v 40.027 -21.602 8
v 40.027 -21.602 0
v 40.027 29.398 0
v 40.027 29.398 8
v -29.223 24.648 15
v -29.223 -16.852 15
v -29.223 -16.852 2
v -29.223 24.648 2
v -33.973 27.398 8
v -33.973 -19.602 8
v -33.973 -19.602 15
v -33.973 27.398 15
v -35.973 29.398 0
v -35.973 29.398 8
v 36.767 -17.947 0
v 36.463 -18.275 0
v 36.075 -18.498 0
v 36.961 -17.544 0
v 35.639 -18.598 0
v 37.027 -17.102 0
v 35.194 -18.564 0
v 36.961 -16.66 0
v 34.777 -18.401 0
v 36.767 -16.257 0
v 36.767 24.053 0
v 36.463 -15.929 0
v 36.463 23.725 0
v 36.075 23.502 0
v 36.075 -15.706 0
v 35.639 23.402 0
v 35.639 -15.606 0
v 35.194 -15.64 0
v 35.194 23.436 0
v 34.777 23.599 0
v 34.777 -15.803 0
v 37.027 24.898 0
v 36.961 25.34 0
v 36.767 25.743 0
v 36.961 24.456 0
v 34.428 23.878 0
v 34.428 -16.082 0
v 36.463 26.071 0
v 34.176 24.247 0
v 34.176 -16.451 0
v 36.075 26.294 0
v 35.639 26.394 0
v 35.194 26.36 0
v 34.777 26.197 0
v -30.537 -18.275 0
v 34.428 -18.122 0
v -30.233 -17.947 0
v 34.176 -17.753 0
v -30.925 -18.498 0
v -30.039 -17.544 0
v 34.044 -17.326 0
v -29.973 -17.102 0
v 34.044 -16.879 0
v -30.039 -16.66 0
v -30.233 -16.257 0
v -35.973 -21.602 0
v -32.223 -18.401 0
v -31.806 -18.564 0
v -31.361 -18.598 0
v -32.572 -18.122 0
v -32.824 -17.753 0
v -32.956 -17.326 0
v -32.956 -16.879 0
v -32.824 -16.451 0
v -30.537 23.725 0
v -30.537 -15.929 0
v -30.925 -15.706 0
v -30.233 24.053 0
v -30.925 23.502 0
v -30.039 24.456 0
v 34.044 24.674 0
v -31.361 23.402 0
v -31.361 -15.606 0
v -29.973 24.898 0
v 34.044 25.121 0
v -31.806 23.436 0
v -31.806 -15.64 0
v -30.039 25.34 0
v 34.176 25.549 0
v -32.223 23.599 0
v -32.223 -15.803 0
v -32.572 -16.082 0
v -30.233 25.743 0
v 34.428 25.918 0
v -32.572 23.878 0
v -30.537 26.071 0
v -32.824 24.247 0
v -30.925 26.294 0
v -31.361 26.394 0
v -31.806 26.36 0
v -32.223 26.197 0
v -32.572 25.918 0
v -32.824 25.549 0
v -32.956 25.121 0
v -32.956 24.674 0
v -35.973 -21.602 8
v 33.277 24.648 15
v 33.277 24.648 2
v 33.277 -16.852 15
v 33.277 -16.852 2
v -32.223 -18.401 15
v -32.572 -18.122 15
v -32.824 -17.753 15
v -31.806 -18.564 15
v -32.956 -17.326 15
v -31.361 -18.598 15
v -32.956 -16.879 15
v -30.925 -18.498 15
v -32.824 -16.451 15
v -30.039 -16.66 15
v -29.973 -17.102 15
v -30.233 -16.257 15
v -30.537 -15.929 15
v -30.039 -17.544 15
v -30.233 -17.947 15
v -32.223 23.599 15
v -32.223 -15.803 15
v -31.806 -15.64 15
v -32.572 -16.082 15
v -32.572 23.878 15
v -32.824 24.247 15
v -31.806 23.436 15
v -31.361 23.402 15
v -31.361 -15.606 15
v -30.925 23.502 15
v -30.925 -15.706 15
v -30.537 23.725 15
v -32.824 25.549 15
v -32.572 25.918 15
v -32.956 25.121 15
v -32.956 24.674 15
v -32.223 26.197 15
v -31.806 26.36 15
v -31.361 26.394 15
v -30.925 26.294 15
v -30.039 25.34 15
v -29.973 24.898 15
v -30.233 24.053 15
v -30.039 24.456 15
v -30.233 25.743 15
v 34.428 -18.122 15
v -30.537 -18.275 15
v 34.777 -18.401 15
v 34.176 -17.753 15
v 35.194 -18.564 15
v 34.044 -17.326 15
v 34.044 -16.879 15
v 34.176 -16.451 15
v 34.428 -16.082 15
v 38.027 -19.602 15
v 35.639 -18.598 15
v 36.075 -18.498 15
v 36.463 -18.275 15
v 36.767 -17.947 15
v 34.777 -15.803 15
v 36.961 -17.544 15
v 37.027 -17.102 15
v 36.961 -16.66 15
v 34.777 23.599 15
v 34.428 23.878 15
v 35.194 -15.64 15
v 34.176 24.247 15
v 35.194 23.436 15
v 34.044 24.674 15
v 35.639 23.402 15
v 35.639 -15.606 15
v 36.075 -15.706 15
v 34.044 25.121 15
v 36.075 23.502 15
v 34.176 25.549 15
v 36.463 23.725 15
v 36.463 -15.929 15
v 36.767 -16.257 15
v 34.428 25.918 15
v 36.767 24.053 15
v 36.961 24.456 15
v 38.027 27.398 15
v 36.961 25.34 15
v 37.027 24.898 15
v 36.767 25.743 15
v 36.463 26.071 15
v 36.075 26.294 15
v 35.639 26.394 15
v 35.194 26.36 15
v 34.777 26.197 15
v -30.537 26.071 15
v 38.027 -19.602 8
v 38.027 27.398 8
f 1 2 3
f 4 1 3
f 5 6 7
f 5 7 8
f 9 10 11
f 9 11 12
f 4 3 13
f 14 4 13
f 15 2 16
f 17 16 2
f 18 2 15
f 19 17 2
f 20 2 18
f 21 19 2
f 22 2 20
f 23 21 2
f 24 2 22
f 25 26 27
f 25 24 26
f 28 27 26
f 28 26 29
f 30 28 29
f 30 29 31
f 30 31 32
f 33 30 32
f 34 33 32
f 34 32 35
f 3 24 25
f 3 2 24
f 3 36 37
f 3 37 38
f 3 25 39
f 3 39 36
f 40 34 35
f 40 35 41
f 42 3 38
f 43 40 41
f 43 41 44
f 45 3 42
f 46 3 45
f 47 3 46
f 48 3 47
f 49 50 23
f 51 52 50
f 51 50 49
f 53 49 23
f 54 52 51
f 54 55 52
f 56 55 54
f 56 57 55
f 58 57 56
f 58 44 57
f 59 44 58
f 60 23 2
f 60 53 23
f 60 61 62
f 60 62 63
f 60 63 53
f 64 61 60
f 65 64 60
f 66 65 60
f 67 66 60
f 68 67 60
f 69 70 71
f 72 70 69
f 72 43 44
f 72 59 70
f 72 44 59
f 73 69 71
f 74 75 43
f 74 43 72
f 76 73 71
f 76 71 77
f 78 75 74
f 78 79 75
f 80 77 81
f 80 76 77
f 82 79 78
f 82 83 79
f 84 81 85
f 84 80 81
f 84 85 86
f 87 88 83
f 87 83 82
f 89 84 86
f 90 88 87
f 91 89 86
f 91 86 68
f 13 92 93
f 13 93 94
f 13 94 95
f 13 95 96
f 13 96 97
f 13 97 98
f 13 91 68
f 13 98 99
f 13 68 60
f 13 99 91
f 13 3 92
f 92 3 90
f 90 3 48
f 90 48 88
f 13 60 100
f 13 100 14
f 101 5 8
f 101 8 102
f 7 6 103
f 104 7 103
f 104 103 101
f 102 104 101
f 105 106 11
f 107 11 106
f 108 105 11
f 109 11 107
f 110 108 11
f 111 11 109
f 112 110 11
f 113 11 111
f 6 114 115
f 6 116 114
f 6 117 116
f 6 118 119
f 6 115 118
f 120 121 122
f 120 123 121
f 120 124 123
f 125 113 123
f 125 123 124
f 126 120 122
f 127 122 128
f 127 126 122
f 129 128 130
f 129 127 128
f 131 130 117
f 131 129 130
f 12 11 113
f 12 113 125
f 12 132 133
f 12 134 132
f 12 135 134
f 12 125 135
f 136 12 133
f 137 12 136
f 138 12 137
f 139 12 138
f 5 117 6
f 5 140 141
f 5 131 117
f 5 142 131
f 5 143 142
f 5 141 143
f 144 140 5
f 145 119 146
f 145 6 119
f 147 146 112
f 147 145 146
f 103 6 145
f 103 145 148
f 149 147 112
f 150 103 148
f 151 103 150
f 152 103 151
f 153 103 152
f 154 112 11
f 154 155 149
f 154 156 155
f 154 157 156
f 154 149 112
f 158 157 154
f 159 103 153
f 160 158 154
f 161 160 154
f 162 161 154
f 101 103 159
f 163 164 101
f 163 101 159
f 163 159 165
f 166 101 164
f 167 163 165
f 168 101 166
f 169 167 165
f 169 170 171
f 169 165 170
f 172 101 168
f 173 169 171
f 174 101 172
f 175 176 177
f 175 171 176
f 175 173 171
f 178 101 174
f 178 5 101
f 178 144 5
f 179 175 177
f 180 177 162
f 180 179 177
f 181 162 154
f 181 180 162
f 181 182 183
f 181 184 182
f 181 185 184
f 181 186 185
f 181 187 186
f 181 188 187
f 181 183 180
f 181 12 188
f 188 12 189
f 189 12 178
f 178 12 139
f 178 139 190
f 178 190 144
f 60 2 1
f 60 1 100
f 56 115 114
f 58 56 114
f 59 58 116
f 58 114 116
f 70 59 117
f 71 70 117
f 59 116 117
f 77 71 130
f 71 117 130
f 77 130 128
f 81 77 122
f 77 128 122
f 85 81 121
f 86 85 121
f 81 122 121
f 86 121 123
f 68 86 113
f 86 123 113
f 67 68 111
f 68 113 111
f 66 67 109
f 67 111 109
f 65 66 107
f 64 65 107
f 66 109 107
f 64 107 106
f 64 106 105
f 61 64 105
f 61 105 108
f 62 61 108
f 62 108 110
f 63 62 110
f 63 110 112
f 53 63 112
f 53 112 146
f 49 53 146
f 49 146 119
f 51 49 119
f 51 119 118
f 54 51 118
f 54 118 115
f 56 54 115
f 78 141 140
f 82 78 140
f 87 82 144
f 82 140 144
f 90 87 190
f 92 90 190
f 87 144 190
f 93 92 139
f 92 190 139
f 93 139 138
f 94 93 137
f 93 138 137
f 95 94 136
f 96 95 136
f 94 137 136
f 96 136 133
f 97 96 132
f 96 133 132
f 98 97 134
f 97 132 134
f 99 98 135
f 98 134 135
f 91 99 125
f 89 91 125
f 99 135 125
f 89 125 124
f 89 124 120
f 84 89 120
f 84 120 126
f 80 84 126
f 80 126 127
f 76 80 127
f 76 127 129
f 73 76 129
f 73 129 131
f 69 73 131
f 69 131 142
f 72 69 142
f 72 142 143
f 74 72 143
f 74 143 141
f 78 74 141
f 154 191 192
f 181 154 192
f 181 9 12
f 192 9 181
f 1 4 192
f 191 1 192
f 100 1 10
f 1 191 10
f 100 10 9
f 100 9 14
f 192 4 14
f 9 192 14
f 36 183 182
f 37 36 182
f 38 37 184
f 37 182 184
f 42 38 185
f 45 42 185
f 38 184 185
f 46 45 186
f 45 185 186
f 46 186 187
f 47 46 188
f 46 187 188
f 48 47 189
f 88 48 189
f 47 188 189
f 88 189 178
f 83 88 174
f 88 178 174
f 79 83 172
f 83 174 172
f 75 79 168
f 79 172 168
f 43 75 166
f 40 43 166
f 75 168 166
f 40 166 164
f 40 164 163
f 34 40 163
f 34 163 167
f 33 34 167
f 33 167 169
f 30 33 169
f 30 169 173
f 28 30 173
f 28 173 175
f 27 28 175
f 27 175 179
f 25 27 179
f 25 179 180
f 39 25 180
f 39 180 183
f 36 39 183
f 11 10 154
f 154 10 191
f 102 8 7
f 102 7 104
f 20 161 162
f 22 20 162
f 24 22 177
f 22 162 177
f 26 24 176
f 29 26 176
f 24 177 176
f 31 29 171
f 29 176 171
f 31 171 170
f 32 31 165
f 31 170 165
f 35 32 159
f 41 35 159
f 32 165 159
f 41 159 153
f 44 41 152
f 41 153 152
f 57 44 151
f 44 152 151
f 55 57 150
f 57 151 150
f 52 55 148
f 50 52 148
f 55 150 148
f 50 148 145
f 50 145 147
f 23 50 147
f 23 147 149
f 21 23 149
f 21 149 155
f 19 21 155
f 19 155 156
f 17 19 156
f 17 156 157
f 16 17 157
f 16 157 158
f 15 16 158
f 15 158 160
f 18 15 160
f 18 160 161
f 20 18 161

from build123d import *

# Parameters (mm, degrees)
SKETCH_1_W          = 72
SKETCH_1_H          = 47
EXTRUDE_1_DEPTH     = 15
SKETCH_2_W          = 62.5
SKETCH_2_H          = 41.5
CUT_EXTRUDE_1_DEPTH = 13
SKETCH_3_R          = 1.5
CUT_EXTRUDE_3_DEPTH = 16
SKETCH_4_W          = 76
SKETCH_4_H          = 51
SKETCH_4_W_2        = 72
SKETCH_4_H_2        = 47
EXTRUDE_2_DEPTH     = 8


with BuildPart() as part:
    # ｽｹｯﾁ1 → ﾎﾞｽ - 押し出し1 (new body)
    with BuildSketch(Plane.XY):
        with Locations((2.027327289, 3.897905759)):
            Rectangle(SKETCH_1_W, SKETCH_1_H)
    extrude(amount=EXTRUDE_1_DEPTH)

    # ｽｹｯﾁ2 → ｶｯﾄ - 押し出し1 (cut)
    with BuildSketch(Plane.XY.offset(15)):
        with Locations((2.027327289, 3.897905759)):
            Rectangle(SKETCH_2_W, SKETCH_2_H)
    extrude(amount=-CUT_EXTRUDE_1_DEPTH, mode=Mode.SUBTRACT)

    # ｽｹｯﾁ3 → ｶｯﾄ - 押し出し3 (cut, through all)
    with BuildSketch(Plane.XY.offset(15)):
        with Locations((-31.472672711, 24.897905759)):
            Circle(SKETCH_3_R)
        with Locations((35.527327289, 24.897905759)):
            Circle(SKETCH_3_R)
        with Locations((-31.472672711, -17.102094241)):
            Circle(SKETCH_3_R)
        with Locations((35.527327289, -17.102094241)):
            Circle(SKETCH_3_R)
    extrude(amount=-CUT_EXTRUDE_3_DEPTH, mode=Mode.SUBTRACT)

    # ｽｹｯﾁ4 → ﾎﾞｽ - 押し出し2 (add)
    with BuildSketch(Plane(origin=(0, 0, 0), x_dir=(-1, 0, 0), z_dir=(0, 0, -1))):
        with Locations((-2.027327289, 3.897905759)):
            Rectangle(SKETCH_4_W, SKETCH_4_H)
        with Locations((-2.027327289, 3.897905759)):
            Rectangle(SKETCH_4_W_2, SKETCH_4_H_2, mode=Mode.SUBTRACT)
    extrude(amount=-EXTRUDE_2_DEPTH)


solid = part.part
